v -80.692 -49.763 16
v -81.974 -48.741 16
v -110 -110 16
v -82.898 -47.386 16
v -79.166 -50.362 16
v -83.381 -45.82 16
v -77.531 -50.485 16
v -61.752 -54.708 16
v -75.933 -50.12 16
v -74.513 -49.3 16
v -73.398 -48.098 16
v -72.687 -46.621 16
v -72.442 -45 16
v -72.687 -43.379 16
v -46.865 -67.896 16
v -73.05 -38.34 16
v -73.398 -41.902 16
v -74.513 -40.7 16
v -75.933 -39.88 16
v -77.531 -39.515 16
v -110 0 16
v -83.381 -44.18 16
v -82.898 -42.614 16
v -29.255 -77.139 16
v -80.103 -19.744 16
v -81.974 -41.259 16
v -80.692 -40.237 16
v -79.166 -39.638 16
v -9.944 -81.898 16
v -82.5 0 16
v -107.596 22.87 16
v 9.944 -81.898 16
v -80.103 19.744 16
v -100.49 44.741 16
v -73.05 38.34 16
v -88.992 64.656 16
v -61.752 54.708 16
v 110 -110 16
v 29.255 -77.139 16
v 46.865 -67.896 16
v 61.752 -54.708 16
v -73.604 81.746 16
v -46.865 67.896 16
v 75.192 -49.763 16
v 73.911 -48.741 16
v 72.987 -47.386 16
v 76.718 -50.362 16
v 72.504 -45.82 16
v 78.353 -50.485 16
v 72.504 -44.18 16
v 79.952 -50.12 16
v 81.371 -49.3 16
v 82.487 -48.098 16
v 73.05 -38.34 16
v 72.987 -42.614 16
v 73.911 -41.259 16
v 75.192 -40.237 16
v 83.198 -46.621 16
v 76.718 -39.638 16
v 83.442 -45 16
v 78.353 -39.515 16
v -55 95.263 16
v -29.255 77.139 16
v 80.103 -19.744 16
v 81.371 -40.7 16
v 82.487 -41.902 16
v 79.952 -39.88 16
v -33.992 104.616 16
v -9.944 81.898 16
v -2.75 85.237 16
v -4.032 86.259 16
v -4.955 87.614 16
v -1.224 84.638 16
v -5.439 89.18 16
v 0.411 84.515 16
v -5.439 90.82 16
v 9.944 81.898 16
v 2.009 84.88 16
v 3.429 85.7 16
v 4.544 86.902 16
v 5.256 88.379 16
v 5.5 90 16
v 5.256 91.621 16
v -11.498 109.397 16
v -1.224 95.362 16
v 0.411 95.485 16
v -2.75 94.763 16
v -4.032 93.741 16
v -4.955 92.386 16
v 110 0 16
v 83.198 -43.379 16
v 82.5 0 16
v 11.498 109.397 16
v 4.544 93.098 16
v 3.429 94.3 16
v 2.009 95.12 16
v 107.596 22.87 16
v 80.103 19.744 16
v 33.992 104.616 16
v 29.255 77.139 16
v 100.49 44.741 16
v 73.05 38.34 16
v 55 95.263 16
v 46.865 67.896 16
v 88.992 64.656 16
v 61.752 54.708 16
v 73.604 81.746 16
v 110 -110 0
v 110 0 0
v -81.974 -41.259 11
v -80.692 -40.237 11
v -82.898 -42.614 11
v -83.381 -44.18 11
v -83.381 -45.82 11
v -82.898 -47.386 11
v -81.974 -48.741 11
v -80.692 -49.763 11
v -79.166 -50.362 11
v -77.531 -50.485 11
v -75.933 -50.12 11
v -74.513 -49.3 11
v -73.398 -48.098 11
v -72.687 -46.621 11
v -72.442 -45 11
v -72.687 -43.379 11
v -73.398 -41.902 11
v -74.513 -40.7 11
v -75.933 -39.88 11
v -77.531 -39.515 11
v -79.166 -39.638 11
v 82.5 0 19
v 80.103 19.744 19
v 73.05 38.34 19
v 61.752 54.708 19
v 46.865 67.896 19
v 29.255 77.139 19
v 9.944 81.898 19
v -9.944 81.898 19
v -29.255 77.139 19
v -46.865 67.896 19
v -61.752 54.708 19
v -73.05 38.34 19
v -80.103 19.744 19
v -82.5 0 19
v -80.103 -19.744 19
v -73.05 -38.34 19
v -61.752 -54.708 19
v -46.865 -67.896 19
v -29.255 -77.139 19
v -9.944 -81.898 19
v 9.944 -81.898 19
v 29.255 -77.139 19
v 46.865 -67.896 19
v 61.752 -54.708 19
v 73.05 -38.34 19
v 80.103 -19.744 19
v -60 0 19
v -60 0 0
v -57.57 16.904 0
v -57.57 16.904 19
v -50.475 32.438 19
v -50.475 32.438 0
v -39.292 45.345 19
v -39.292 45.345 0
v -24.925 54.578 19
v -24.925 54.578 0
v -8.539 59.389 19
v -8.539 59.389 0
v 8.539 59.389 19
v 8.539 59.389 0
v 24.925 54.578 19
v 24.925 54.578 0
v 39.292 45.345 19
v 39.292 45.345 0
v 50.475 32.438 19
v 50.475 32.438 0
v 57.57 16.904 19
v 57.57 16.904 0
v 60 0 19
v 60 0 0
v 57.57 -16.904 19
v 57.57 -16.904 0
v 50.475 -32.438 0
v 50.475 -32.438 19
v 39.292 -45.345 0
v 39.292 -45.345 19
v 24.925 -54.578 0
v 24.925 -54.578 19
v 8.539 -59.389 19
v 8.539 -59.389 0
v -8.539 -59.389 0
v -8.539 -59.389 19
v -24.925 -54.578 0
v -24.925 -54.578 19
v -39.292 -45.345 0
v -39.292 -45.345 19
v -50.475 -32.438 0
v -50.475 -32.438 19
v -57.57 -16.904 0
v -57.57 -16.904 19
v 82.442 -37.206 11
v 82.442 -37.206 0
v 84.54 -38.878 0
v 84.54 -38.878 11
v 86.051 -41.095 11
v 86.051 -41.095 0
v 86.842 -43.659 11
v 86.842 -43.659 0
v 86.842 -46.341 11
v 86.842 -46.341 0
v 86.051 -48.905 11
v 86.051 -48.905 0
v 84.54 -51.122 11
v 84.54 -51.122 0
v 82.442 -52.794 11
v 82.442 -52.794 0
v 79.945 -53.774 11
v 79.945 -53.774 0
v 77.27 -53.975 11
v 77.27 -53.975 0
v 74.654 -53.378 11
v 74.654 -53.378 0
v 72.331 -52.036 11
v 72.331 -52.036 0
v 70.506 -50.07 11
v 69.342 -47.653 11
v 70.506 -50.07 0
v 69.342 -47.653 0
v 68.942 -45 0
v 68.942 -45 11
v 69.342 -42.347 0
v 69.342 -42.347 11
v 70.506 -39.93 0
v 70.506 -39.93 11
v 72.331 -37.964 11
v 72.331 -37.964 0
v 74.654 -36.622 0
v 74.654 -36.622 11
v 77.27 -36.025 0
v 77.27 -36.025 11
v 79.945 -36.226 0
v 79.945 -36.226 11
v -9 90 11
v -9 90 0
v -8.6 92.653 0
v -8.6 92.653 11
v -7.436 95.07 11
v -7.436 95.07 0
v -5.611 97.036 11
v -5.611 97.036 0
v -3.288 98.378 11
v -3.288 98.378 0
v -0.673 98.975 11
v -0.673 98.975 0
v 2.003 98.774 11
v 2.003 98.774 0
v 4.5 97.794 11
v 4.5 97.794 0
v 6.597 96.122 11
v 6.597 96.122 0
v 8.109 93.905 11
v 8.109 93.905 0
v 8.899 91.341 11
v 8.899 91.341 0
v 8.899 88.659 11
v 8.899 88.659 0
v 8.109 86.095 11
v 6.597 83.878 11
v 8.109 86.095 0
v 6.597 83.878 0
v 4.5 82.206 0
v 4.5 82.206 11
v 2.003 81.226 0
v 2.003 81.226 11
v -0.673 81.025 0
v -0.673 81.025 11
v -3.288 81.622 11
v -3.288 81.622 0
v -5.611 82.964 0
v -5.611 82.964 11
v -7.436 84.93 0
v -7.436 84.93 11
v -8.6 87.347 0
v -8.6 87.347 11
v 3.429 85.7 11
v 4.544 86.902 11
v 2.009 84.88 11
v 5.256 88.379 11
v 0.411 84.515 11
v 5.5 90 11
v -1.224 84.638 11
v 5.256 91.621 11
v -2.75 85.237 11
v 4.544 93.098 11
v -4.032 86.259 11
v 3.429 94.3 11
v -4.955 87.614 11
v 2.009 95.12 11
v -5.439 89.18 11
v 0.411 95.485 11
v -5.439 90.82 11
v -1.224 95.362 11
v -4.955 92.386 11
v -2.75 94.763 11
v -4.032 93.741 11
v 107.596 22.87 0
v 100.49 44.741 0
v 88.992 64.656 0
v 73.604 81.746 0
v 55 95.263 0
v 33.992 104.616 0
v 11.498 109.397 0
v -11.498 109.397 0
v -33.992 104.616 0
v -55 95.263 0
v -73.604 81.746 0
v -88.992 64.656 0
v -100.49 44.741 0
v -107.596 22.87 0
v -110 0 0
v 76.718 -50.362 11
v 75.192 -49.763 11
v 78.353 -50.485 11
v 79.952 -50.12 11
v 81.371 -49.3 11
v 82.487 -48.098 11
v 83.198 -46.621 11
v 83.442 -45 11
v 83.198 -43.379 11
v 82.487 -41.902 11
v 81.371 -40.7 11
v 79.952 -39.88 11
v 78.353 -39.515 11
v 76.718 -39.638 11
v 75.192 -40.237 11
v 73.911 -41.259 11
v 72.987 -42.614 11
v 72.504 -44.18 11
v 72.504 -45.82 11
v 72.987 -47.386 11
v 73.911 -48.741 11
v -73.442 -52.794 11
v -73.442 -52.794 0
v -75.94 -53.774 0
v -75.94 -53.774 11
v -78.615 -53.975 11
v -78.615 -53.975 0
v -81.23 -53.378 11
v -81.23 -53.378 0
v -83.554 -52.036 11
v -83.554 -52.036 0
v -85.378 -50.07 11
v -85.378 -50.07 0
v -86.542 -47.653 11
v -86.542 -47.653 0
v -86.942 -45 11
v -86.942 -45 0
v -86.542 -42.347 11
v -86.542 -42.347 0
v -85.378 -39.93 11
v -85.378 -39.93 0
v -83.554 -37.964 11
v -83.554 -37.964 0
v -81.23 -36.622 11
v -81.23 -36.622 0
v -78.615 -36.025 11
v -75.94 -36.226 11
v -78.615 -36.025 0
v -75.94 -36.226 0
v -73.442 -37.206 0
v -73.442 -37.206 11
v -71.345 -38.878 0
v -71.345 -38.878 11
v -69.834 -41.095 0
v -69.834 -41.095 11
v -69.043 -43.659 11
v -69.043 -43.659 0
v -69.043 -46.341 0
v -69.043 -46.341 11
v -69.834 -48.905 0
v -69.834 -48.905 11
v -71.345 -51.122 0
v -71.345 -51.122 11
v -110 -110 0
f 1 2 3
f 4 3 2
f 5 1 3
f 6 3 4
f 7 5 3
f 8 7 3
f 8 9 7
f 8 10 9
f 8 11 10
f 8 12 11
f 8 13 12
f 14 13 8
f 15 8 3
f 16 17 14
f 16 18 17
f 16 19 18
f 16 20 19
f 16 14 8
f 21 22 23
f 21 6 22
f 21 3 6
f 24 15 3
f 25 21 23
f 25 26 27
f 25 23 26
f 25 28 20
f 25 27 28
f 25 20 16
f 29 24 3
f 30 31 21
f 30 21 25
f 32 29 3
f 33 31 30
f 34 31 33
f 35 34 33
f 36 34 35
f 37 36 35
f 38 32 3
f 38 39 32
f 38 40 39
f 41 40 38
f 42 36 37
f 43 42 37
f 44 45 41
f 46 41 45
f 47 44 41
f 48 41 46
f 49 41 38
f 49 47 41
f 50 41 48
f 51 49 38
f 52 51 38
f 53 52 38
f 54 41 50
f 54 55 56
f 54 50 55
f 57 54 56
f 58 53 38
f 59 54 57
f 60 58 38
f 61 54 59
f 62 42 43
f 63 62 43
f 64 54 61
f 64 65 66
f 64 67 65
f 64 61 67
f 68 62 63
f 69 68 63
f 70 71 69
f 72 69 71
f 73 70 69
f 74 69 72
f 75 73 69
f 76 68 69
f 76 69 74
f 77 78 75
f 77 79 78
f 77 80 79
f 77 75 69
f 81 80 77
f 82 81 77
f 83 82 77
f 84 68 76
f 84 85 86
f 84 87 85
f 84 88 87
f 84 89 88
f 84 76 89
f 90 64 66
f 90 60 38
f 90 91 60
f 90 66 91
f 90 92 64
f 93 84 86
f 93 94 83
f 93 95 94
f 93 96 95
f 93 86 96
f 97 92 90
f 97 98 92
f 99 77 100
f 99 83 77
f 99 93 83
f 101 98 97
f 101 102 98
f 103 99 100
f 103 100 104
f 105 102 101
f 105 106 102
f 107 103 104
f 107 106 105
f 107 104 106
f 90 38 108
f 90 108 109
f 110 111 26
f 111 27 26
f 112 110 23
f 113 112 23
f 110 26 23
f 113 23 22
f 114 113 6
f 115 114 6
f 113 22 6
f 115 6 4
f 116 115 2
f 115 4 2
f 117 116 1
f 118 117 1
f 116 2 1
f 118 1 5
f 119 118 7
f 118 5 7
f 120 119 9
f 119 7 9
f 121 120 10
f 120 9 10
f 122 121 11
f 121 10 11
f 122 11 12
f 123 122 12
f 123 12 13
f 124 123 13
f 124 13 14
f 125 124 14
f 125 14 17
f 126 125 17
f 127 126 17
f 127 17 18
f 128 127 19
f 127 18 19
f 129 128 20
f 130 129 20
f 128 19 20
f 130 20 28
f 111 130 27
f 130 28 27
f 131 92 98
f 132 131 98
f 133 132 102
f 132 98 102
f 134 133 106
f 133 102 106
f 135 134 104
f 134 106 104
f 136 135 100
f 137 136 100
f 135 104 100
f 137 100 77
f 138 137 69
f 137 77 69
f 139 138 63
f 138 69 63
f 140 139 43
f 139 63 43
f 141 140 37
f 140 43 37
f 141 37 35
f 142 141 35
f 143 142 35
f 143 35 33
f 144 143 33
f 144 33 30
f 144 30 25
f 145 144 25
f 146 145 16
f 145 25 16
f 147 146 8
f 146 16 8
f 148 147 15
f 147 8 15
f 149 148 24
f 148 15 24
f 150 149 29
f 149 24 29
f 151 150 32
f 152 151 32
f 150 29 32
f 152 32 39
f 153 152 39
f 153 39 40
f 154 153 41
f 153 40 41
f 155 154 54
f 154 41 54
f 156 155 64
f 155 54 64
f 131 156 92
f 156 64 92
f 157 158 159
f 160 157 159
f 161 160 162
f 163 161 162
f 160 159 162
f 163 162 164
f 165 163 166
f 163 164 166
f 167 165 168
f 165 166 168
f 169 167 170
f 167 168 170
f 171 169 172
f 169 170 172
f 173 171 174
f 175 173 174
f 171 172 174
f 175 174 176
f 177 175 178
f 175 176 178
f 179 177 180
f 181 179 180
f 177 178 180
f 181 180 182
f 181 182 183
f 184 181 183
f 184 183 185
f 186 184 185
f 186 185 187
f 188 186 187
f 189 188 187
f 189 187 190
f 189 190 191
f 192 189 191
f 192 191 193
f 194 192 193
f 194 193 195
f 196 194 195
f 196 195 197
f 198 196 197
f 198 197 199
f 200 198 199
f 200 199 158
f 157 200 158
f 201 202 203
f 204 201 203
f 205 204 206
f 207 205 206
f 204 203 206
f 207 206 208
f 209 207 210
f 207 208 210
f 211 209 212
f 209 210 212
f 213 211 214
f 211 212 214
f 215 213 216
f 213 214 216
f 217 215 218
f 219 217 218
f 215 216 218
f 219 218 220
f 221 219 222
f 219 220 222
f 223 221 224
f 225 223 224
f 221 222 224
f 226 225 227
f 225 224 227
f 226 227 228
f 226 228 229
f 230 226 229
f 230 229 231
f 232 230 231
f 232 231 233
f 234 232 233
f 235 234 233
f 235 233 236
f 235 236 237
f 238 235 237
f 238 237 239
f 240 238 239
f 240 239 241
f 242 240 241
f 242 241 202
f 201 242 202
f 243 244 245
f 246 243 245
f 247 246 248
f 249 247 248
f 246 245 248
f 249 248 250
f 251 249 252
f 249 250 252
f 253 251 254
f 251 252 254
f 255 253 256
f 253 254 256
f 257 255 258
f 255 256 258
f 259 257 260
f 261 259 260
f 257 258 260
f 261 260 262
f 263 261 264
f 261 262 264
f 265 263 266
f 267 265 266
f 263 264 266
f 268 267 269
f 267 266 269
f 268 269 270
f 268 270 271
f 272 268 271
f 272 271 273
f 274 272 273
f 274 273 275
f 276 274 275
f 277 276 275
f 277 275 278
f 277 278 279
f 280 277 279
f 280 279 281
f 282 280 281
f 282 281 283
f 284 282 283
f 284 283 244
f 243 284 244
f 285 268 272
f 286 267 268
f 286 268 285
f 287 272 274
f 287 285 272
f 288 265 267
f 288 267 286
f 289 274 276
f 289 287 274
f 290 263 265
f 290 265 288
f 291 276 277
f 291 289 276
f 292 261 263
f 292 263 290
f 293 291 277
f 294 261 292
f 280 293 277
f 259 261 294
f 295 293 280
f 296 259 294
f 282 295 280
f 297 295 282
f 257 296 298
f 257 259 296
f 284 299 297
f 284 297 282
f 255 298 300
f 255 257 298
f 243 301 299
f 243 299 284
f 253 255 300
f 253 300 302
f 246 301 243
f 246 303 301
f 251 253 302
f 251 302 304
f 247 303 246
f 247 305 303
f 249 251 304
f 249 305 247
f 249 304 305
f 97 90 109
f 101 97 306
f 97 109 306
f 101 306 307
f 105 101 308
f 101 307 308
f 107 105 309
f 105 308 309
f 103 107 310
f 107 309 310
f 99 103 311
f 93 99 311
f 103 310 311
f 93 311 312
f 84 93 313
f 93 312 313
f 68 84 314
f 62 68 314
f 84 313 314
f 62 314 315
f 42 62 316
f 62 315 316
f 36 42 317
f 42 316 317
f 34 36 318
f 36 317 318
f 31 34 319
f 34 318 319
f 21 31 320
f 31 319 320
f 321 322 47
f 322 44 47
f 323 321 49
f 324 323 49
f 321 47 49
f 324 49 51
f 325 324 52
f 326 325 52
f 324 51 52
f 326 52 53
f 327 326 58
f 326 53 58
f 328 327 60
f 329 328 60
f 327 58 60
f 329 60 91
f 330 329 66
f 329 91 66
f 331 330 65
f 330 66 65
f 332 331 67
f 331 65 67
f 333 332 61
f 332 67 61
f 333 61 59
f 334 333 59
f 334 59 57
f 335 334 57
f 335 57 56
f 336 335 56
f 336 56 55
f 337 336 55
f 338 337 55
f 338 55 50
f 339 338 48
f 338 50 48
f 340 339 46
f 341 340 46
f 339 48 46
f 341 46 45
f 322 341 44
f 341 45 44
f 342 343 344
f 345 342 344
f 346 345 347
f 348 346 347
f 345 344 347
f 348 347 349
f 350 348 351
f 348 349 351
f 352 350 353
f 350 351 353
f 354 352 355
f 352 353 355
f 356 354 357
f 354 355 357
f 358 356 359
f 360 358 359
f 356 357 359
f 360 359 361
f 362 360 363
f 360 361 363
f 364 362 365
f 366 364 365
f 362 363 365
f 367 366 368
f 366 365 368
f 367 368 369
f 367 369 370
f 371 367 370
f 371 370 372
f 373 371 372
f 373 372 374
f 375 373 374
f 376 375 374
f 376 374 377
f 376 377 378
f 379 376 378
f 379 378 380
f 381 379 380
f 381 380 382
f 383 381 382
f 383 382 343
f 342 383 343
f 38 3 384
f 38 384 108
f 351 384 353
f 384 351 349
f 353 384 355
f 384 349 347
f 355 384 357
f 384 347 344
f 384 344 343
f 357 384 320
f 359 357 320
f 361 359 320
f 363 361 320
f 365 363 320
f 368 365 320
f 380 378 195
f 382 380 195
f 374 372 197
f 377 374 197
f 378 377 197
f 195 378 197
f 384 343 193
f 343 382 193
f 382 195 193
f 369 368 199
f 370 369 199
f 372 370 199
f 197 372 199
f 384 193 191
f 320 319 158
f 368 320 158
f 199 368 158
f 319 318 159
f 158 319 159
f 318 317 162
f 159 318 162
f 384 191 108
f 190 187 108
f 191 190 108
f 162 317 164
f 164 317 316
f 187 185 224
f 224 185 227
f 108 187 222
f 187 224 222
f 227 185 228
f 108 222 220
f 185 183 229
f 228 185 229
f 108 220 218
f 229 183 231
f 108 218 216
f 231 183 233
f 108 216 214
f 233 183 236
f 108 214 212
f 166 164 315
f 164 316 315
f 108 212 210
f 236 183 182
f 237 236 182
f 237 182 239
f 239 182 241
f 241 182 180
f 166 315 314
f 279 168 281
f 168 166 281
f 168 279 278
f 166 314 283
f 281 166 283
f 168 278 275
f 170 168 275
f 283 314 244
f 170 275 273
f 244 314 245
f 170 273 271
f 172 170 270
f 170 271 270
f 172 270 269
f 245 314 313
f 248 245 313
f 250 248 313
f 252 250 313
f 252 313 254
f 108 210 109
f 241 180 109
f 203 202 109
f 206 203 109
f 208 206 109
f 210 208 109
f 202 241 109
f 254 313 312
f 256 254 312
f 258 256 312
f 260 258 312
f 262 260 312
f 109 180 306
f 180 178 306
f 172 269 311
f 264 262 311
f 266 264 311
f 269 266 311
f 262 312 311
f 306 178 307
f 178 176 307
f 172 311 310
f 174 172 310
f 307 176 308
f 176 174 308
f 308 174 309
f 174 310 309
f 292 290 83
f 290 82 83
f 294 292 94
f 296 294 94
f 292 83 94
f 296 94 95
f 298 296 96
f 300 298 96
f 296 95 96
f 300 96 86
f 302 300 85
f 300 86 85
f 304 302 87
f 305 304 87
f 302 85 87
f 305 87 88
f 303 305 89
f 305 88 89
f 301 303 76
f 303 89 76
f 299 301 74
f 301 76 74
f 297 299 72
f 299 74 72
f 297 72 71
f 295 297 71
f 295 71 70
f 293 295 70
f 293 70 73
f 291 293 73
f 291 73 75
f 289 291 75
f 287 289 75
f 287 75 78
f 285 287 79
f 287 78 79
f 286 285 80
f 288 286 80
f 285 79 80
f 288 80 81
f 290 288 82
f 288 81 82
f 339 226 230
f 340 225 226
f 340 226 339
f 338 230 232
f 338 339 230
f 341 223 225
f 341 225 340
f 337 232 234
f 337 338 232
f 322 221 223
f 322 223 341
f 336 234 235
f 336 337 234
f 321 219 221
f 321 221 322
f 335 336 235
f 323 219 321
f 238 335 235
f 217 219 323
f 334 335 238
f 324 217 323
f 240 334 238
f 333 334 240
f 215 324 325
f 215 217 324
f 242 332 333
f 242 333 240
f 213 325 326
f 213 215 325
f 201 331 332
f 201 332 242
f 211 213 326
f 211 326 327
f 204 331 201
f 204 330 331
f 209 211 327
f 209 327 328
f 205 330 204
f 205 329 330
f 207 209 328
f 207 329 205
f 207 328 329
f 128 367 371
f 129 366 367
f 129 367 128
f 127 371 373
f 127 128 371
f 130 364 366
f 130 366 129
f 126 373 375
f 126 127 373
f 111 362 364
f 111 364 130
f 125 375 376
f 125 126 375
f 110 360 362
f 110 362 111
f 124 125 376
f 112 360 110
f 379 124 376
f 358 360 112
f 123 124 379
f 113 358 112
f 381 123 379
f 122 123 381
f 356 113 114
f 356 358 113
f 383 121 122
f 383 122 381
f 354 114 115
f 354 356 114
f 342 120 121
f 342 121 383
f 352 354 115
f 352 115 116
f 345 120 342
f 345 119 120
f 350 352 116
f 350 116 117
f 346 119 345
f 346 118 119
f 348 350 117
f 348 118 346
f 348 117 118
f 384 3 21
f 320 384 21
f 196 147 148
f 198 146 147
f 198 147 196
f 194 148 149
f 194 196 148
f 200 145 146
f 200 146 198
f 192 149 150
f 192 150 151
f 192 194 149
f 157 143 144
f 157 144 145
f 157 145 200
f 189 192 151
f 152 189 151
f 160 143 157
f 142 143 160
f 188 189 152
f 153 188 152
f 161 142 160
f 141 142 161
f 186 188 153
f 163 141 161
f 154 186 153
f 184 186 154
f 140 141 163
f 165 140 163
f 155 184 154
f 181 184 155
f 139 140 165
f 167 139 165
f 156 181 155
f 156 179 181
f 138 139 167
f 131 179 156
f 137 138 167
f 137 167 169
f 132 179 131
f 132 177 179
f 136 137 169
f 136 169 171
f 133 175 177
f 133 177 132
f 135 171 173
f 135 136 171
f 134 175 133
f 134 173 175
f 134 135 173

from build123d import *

# Parameters (mm, degrees)
SKETCH_1_R                = 110
EXTRUDE_1_DEPTH           = 16
SKETCH_2_W                = 220
SKETCH_2_H                = 110
EXTRUDE_2_DEPTH           = 16
SKETCH_3_R                = 82.5
EXTRUDE_3_DEPTH           = 3
HOLE_WIZARD_1_D           = 11
HOLE_WIZARD_1_CBORE_D     = 18
HOLE_WIZARD_1_CBORE_DEPTH = 11
PATTERN_CIRCULAR_1_COUNT  = 3
SKETCH_6_R                = 60
CUT_EXTRUDE_1_DEPTH       = 157.719494639


with BuildPart() as part:
    # 草图1 → 凸台-拉伸1 (new body)
    with BuildSketch(Plane.XY):
        Circle(SKETCH_1_R)
    extrude(amount=EXTRUDE_1_DEPTH)

    # 草图2 → 凸台-拉伸2 (add)
    with BuildSketch(Plane.XY.offset(16)):
        with Locations((0, -55)):
            Rectangle(SKETCH_2_W, SKETCH_2_H)
    extrude(amount=-EXTRUDE_2_DEPTH)

    # 草图3 → 凸台-拉伸3 (add)
    with BuildSketch(Plane.XY.offset(16)):
        Circle(SKETCH_3_R)
    extrude(amount=EXTRUDE_3_DEPTH)

    # 打孔尺寸(%根据)内六角圆柱头螺钉的类型1 (through all)
    with Locations(Plane(origin=(0, 0, 0), x_dir=(-1, 0, 0), z_dir=(0, 0, -1))):
        with Locations((0, 90)):
            hole_wizard_1 = CounterBoreHole(HOLE_WIZARD_1_D / 2, HOLE_WIZARD_1_CBORE_D / 2, HOLE_WIZARD_1_CBORE_DEPTH)

    # 阵列(圆周)1: 打孔尺寸(%根据)内六角圆柱头螺钉的类型1 ×3 about axis
    pattern_circular_1_axis = Axis((0, 0, 0), (0, 0, 1))
    for i in range(1, PATTERN_CIRCULAR_1_COUNT):
        add(hole_wizard_1.rotate(pattern_circular_1_axis, i * 360 / PATTERN_CIRCULAR_1_COUNT), mode=Mode.SUBTRACT)

    # 草图6 → 切除-拉伸1 (cut, through all)
    with BuildSketch(Plane(origin=(0, 0, 0), x_dir=(-1, 0, 0), z_dir=(0, 0, -1))):
        Circle(SKETCH_6_R)
    extrude(amount=-CUT_EXTRUDE_1_DEPTH, mode=Mode.SUBTRACT)


solid = part.part
